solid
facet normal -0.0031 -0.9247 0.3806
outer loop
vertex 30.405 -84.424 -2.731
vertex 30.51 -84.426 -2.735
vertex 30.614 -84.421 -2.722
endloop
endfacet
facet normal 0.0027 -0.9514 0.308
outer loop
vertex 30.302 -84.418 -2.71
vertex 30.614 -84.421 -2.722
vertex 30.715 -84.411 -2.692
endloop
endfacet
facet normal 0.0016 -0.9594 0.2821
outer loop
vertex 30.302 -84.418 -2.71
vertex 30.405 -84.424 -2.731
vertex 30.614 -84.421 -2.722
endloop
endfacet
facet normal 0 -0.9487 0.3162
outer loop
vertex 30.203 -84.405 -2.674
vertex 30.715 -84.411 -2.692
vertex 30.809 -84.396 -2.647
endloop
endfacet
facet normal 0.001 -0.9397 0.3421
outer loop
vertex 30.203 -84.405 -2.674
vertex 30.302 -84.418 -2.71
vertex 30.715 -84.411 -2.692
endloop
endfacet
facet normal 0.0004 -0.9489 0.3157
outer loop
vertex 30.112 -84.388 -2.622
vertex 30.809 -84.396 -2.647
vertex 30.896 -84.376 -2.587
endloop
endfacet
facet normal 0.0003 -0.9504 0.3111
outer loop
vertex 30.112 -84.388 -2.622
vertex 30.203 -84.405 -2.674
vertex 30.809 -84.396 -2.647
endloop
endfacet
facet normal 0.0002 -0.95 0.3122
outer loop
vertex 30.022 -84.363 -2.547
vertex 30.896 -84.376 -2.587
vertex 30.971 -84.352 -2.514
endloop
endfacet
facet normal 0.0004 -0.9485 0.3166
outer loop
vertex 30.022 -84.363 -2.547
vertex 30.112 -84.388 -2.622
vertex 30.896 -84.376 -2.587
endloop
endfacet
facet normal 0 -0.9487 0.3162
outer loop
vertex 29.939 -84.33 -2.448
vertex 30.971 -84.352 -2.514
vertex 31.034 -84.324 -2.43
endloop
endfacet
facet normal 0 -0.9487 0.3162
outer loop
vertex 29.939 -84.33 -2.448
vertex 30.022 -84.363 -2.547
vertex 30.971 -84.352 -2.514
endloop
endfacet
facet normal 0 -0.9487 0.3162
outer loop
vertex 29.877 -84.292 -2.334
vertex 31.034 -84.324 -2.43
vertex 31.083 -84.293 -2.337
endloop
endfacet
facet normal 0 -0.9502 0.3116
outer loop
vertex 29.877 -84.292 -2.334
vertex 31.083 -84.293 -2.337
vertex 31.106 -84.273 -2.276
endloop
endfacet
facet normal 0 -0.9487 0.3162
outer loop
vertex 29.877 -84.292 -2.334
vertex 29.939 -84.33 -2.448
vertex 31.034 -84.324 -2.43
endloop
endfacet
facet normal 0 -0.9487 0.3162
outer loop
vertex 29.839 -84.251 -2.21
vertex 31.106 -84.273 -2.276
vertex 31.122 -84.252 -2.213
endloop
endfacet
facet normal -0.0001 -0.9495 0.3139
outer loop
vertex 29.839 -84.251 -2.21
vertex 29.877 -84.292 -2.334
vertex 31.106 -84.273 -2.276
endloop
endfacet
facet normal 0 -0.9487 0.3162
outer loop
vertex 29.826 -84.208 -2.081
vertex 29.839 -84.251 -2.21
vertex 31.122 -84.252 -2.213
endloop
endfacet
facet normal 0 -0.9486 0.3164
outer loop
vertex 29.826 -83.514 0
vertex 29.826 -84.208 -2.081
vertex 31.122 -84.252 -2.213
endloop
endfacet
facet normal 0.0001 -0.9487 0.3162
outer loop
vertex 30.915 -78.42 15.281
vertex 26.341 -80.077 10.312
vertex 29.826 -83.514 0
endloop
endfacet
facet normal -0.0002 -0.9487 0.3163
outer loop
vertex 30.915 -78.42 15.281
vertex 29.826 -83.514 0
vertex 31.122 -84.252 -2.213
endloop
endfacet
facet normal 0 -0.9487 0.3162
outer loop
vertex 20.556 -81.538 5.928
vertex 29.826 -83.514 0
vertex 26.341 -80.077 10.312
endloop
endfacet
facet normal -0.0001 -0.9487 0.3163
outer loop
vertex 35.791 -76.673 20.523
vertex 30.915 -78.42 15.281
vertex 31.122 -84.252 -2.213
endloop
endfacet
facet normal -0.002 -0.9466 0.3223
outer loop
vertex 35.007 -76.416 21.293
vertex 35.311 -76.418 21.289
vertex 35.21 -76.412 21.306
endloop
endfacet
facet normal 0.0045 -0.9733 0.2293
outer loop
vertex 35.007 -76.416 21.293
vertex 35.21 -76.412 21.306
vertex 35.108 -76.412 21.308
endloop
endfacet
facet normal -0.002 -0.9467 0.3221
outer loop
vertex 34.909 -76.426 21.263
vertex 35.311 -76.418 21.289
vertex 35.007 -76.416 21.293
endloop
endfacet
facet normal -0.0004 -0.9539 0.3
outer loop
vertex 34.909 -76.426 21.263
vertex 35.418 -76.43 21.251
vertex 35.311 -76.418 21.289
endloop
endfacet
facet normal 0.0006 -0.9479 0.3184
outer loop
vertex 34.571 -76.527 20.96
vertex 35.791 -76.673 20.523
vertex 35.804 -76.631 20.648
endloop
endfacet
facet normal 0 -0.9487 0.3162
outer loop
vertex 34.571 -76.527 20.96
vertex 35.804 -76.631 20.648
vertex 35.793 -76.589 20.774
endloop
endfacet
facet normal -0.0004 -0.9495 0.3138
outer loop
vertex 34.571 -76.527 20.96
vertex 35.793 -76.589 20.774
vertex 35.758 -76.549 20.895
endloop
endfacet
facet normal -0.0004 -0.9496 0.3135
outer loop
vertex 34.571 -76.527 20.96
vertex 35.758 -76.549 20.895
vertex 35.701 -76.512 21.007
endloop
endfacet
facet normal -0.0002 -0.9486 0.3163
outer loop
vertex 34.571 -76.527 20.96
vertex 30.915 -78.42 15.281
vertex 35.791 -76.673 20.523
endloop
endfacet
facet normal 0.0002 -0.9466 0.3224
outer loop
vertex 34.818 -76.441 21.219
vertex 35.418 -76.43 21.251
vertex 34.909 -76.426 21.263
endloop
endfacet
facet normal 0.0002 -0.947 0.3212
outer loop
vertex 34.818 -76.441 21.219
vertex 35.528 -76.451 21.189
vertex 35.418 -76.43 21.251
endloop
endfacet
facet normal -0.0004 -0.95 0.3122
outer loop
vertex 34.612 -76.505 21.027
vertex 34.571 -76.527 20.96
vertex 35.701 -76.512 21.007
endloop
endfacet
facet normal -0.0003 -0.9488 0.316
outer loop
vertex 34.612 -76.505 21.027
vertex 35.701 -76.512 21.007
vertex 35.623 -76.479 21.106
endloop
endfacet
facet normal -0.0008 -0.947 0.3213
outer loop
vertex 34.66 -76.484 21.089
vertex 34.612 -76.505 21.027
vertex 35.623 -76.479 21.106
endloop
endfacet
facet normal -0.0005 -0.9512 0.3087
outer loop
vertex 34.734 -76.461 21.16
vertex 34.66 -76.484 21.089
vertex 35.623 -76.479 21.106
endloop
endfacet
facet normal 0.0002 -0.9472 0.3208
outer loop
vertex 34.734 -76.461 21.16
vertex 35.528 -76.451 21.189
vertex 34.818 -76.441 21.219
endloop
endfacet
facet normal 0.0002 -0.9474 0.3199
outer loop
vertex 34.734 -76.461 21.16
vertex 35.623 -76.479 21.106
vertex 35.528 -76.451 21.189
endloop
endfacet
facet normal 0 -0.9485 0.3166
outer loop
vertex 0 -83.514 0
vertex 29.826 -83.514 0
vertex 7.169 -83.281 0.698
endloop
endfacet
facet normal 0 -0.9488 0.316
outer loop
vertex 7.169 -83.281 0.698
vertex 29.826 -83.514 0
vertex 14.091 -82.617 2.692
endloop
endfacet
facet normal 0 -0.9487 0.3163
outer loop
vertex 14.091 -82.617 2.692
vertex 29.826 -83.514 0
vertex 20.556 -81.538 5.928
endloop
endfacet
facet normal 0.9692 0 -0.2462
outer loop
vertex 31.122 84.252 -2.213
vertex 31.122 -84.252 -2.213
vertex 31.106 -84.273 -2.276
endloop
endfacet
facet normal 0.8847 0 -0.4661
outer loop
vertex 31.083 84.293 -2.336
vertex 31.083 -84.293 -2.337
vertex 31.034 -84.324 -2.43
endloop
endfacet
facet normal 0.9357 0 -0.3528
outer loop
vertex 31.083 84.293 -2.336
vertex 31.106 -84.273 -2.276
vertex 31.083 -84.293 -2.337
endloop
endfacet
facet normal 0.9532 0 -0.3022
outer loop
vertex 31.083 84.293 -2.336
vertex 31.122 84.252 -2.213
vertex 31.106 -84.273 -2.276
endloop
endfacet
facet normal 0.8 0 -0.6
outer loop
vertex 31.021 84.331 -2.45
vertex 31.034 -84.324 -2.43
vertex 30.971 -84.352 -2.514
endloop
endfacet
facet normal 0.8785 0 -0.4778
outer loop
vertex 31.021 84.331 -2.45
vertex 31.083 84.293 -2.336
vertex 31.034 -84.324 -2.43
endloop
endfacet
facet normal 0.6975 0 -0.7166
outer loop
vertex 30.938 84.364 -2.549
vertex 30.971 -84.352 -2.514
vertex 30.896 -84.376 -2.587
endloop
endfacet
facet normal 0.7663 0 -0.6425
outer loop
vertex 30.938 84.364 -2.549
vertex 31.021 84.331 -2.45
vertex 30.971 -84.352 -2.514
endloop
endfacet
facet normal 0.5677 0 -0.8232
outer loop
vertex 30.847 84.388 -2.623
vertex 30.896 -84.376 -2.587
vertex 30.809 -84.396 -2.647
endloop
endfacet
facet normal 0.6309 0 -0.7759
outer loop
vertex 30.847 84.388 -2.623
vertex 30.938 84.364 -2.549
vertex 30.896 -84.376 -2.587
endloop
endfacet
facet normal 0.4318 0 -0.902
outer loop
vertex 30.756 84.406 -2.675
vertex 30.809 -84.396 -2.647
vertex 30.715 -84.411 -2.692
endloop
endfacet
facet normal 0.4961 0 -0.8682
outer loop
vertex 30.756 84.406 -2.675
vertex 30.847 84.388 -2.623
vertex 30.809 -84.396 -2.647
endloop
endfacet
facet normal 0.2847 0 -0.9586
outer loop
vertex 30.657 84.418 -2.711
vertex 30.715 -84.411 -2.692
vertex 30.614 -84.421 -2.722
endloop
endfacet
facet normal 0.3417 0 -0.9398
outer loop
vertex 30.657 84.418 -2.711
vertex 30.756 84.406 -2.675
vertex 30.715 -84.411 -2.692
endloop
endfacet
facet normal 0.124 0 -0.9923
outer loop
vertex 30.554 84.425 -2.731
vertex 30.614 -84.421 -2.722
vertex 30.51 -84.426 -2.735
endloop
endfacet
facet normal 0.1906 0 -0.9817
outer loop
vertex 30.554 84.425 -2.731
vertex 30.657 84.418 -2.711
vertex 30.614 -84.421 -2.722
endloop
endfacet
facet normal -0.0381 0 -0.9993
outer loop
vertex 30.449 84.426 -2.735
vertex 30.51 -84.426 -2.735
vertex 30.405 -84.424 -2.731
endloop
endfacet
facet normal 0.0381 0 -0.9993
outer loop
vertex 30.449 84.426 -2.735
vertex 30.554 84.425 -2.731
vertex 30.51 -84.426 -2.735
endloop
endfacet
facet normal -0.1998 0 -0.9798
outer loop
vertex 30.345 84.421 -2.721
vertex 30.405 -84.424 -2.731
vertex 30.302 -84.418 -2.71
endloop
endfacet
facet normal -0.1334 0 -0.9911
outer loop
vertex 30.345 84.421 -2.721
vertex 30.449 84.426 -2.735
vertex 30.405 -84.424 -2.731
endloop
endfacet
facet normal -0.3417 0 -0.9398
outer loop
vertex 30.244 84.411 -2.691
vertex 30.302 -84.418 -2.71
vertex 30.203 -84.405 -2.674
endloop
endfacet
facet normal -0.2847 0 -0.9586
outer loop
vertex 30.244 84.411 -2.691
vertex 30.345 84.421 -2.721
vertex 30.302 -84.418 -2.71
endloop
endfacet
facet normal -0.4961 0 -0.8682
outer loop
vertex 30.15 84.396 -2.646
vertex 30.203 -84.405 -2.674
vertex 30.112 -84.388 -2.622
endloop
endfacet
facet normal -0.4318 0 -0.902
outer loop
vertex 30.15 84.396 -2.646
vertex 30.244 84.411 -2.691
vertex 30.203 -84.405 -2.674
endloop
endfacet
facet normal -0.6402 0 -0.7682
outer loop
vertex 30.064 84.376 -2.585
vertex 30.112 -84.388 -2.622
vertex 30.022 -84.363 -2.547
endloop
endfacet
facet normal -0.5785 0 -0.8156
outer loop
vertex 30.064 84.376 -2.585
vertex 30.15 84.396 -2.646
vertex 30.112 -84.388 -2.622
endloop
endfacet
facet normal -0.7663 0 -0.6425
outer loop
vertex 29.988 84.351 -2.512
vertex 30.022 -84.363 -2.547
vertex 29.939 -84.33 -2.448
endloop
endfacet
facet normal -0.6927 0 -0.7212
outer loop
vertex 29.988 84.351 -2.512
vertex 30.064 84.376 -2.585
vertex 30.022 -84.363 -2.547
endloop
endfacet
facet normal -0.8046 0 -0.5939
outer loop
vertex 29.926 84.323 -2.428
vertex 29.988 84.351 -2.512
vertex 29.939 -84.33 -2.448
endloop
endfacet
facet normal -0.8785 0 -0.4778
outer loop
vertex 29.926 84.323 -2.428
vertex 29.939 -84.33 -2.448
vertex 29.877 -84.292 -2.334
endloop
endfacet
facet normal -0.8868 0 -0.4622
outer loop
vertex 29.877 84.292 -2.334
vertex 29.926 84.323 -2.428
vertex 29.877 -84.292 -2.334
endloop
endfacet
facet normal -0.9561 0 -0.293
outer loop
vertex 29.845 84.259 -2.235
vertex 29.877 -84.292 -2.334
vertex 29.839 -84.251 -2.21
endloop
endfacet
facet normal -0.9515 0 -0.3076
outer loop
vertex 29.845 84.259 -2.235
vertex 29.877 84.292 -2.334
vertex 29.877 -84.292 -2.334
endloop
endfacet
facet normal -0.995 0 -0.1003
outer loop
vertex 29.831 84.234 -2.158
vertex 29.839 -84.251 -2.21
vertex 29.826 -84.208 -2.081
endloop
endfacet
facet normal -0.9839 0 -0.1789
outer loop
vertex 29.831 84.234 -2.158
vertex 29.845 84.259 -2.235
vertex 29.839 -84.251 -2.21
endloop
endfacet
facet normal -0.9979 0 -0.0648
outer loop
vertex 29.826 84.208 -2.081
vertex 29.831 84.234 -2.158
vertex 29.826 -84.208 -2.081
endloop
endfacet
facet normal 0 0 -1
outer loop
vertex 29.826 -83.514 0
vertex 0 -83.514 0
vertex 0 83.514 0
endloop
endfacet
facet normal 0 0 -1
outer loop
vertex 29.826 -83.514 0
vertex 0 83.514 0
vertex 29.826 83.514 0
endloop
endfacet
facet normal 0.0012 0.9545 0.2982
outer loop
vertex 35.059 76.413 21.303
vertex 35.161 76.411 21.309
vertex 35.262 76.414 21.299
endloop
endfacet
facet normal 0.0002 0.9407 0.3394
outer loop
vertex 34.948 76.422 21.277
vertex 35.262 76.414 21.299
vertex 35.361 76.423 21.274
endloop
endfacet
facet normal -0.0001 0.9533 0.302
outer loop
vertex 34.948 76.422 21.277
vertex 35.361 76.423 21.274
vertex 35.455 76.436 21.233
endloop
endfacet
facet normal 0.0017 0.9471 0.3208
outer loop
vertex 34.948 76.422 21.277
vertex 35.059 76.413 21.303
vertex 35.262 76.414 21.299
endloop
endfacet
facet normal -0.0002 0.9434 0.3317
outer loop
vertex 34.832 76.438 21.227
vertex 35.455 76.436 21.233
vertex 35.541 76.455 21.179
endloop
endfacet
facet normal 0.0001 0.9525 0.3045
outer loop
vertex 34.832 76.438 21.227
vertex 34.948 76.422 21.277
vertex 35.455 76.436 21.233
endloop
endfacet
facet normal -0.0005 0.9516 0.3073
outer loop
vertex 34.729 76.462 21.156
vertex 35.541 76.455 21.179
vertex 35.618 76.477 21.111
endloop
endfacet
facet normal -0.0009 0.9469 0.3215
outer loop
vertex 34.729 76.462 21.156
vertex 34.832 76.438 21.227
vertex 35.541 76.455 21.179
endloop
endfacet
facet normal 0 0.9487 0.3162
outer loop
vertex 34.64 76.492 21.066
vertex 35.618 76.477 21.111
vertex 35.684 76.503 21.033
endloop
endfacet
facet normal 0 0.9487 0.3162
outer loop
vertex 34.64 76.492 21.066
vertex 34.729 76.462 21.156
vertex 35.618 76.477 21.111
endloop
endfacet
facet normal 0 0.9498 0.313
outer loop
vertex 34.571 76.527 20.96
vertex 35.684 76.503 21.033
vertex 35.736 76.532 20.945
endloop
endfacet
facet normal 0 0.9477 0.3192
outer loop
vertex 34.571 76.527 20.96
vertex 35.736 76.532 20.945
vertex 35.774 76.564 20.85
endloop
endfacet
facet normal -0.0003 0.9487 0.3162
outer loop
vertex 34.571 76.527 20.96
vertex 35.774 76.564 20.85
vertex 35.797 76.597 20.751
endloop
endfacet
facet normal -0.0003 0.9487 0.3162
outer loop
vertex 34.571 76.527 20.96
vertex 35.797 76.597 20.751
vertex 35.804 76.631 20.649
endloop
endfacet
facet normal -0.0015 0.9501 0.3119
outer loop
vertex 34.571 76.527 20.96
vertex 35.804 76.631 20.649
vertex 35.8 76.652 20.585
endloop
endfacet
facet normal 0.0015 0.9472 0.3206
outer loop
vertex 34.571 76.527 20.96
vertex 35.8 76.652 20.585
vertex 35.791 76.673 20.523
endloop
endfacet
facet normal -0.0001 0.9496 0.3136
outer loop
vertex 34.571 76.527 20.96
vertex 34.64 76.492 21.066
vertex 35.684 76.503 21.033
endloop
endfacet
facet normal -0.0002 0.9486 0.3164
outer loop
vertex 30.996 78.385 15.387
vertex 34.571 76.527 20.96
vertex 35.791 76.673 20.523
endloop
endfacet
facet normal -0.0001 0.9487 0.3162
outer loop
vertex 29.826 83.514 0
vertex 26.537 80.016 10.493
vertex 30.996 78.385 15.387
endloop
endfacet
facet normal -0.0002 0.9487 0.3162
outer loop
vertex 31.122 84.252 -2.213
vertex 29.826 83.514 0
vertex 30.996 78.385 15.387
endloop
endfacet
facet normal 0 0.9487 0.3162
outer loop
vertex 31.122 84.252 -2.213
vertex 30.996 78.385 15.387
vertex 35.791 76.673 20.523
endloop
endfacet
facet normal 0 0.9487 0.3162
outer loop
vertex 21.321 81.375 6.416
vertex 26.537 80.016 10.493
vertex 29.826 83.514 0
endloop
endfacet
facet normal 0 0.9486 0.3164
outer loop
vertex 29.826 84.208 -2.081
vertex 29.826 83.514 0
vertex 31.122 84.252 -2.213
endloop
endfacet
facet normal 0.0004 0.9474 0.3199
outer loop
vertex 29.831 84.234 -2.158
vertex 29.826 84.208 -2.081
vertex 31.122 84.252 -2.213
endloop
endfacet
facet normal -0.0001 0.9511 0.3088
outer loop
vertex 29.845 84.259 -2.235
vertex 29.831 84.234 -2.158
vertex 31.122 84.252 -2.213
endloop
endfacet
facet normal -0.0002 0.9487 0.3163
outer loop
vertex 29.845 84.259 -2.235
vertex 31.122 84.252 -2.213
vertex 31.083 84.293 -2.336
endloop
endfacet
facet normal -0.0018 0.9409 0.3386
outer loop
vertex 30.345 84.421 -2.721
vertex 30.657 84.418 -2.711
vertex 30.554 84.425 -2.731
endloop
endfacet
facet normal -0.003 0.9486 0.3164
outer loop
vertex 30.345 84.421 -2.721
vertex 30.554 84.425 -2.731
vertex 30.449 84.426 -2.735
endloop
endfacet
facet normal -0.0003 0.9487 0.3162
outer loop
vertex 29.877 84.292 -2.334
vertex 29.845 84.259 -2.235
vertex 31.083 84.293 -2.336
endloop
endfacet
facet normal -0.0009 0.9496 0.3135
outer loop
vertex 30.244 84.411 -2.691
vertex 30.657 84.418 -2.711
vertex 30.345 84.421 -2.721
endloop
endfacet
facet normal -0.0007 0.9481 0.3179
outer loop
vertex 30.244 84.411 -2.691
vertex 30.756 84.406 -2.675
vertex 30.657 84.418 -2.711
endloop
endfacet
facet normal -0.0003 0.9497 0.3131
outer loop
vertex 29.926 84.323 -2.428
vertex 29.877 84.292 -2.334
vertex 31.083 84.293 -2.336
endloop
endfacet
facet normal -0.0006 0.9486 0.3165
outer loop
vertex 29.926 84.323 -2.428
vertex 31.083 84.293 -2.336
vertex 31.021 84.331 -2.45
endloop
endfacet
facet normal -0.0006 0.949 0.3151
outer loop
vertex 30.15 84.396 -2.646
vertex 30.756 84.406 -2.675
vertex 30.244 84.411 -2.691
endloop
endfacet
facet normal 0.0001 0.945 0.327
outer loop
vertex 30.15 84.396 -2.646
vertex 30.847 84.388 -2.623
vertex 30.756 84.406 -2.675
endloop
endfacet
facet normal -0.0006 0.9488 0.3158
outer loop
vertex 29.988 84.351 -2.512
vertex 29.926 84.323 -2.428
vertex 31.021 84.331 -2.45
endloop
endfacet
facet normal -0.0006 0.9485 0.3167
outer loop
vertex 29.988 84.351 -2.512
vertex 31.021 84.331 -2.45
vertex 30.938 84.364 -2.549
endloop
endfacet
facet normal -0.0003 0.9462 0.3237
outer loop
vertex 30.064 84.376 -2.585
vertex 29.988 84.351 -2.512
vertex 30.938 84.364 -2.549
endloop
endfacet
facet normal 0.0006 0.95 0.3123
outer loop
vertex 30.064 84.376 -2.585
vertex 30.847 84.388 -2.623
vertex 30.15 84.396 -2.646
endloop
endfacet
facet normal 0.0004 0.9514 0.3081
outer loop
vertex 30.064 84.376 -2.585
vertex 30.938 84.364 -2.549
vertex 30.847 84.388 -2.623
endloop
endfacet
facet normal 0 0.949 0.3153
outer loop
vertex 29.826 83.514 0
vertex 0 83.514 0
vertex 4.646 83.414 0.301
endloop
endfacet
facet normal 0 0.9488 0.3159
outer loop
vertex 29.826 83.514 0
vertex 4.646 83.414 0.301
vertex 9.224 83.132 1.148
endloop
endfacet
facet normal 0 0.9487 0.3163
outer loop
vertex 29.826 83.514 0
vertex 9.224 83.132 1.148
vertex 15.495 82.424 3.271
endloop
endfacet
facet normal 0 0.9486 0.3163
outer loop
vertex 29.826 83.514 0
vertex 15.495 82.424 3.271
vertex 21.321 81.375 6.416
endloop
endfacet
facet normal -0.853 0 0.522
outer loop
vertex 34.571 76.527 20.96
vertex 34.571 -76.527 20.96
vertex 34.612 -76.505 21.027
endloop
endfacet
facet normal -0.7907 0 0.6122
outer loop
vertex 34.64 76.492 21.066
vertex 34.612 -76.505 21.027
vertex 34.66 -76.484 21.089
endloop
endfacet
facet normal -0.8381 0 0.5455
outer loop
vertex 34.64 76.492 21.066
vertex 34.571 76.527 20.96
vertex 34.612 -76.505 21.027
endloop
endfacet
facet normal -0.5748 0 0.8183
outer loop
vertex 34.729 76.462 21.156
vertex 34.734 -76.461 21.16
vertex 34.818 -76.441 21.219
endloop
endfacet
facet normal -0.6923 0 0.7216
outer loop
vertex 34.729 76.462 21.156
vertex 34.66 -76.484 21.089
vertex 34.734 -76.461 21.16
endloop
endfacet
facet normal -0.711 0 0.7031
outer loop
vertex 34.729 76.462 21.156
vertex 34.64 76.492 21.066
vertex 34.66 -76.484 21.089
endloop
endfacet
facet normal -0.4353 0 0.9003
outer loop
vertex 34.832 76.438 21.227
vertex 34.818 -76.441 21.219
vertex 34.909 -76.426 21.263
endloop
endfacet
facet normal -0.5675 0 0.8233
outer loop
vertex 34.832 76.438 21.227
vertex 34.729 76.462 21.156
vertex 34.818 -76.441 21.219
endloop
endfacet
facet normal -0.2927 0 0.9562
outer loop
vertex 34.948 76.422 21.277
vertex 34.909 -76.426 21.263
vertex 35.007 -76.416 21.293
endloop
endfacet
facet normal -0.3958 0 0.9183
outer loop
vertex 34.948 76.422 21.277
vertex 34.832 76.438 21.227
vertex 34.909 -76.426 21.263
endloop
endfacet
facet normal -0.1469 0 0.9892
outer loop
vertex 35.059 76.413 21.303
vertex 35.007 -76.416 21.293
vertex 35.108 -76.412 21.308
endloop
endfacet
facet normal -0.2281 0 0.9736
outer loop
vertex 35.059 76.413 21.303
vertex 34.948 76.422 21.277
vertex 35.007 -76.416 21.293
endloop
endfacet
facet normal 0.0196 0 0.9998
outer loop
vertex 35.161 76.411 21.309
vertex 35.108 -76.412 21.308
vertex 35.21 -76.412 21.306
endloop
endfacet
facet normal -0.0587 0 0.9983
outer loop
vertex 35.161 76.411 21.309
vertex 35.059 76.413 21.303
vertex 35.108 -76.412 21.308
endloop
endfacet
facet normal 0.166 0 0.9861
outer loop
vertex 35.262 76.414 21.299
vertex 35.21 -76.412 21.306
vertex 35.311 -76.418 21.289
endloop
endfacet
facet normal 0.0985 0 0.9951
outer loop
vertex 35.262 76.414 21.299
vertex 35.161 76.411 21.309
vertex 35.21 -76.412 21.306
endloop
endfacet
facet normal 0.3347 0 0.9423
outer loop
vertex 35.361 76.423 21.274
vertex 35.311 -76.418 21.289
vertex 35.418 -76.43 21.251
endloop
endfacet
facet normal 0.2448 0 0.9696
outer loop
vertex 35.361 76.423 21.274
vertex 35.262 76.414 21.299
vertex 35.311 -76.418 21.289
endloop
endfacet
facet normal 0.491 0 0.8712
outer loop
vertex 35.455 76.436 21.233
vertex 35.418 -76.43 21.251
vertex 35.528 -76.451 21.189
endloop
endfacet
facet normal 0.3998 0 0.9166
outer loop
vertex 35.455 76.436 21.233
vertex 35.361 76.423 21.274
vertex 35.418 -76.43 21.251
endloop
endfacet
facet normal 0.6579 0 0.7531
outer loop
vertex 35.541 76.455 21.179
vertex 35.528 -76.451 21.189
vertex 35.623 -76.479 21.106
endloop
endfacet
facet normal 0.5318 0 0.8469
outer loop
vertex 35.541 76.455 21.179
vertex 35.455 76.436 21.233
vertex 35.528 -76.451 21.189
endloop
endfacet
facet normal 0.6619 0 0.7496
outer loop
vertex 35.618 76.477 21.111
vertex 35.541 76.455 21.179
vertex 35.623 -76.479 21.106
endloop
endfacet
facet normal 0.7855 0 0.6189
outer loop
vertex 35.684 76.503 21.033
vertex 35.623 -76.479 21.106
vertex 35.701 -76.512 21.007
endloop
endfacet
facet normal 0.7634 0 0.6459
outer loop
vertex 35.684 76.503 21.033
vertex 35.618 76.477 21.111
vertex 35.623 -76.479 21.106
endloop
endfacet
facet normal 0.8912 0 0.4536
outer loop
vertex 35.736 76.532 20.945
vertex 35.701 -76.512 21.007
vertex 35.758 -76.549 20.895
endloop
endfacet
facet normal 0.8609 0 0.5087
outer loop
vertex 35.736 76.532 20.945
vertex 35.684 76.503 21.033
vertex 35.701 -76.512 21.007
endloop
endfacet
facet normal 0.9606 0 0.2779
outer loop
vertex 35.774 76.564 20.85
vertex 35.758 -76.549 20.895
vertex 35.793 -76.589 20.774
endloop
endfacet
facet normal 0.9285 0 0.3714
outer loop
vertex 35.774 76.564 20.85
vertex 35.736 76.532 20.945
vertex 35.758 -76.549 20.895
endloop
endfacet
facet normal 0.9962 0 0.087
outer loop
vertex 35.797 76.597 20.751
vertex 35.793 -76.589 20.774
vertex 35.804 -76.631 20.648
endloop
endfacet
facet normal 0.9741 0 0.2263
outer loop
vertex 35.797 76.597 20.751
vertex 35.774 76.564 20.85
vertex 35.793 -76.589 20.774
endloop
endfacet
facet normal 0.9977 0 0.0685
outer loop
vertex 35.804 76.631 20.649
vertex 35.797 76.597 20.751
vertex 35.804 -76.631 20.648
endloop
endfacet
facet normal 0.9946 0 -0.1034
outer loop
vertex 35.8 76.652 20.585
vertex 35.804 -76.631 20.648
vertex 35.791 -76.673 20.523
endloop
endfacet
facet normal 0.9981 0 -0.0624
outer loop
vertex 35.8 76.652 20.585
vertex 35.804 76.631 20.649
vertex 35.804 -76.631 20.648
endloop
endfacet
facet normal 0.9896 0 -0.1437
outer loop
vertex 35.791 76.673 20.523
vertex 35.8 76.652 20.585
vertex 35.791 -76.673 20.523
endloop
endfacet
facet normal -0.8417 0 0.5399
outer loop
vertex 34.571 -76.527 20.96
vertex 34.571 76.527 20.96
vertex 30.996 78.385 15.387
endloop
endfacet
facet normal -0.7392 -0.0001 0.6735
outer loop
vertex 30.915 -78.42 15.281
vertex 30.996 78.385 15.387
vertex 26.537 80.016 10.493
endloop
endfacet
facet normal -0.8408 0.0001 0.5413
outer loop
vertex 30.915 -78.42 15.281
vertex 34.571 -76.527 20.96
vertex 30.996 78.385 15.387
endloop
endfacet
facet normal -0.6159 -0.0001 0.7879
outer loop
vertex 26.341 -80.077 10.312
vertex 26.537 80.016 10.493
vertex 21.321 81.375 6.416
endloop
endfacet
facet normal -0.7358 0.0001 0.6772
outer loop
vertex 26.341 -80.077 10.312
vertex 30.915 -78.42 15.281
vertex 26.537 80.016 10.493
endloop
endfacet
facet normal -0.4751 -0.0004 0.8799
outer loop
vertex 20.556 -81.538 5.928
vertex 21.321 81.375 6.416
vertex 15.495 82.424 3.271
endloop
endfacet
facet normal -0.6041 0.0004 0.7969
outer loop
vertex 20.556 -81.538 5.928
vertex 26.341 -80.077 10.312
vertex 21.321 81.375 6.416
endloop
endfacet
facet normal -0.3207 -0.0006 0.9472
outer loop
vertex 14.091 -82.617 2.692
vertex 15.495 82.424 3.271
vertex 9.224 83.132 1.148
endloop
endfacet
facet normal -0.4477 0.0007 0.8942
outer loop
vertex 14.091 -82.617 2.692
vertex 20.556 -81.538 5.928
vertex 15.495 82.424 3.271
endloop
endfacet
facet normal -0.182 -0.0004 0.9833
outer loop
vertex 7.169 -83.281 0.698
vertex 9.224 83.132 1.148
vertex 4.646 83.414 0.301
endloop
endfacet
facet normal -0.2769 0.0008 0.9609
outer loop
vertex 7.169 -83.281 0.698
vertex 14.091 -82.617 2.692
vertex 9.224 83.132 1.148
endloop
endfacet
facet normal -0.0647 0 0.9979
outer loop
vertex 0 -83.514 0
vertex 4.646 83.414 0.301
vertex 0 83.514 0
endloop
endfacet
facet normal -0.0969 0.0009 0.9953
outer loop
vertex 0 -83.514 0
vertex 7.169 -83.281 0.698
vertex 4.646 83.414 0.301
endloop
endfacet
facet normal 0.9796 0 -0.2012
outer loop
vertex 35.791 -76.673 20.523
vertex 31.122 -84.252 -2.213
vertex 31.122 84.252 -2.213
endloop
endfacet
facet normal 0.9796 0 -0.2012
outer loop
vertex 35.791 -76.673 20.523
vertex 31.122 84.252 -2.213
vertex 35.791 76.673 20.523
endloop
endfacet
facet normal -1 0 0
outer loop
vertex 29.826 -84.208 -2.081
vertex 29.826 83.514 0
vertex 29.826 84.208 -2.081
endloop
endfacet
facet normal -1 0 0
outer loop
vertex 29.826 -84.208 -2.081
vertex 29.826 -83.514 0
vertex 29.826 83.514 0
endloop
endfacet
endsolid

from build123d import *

# Parameters (mm, degrees)
F1_DEPTH = 86.868
F2_R     = 0.654509
F4_DEPTH = 63.246


with BuildPart() as f1:
    # F0 (on Front) → F1 (new body, symmetric)
    with BuildSketch(Plane.XZ):
        with BuildLine():
            ThreePointArc((37.085507, 26.82781), (22.84608, 7.465189), (0, 0))
            Line((0, 0), (29.826211, 0))
            Line((29.826211, 0), (29.826211, -8.521775))
            Line((29.826211, -8.521775), (37.085507, 26.82781))
        make_face()
    extrude(amount=F1_DEPTH, both=True)

    # F2
    f2_edges = [f1.edges().sort_by_distance(p)[0] for p in [
        (37.085507, 0, 26.82781),
        (29.826211, 0, -8.521775),
    ]]
    fillet(f2_edges, radius=F2_R)

    # F3 (on Right) → F4 (cut)
    with BuildSketch(Plane.YZ):
        Polygon((-90.376258, -20.586515), (-65.263629, 54.75137), (-99.720493, 31.098777), align=None)
        Polygon((99.720493, 31.098777), (65.263629, 54.75137), (90.376258, -20.586515), align=None)
    extrude(amount=F4_DEPTH, mode=Mode.SUBTRACT)


solid = f1.part
